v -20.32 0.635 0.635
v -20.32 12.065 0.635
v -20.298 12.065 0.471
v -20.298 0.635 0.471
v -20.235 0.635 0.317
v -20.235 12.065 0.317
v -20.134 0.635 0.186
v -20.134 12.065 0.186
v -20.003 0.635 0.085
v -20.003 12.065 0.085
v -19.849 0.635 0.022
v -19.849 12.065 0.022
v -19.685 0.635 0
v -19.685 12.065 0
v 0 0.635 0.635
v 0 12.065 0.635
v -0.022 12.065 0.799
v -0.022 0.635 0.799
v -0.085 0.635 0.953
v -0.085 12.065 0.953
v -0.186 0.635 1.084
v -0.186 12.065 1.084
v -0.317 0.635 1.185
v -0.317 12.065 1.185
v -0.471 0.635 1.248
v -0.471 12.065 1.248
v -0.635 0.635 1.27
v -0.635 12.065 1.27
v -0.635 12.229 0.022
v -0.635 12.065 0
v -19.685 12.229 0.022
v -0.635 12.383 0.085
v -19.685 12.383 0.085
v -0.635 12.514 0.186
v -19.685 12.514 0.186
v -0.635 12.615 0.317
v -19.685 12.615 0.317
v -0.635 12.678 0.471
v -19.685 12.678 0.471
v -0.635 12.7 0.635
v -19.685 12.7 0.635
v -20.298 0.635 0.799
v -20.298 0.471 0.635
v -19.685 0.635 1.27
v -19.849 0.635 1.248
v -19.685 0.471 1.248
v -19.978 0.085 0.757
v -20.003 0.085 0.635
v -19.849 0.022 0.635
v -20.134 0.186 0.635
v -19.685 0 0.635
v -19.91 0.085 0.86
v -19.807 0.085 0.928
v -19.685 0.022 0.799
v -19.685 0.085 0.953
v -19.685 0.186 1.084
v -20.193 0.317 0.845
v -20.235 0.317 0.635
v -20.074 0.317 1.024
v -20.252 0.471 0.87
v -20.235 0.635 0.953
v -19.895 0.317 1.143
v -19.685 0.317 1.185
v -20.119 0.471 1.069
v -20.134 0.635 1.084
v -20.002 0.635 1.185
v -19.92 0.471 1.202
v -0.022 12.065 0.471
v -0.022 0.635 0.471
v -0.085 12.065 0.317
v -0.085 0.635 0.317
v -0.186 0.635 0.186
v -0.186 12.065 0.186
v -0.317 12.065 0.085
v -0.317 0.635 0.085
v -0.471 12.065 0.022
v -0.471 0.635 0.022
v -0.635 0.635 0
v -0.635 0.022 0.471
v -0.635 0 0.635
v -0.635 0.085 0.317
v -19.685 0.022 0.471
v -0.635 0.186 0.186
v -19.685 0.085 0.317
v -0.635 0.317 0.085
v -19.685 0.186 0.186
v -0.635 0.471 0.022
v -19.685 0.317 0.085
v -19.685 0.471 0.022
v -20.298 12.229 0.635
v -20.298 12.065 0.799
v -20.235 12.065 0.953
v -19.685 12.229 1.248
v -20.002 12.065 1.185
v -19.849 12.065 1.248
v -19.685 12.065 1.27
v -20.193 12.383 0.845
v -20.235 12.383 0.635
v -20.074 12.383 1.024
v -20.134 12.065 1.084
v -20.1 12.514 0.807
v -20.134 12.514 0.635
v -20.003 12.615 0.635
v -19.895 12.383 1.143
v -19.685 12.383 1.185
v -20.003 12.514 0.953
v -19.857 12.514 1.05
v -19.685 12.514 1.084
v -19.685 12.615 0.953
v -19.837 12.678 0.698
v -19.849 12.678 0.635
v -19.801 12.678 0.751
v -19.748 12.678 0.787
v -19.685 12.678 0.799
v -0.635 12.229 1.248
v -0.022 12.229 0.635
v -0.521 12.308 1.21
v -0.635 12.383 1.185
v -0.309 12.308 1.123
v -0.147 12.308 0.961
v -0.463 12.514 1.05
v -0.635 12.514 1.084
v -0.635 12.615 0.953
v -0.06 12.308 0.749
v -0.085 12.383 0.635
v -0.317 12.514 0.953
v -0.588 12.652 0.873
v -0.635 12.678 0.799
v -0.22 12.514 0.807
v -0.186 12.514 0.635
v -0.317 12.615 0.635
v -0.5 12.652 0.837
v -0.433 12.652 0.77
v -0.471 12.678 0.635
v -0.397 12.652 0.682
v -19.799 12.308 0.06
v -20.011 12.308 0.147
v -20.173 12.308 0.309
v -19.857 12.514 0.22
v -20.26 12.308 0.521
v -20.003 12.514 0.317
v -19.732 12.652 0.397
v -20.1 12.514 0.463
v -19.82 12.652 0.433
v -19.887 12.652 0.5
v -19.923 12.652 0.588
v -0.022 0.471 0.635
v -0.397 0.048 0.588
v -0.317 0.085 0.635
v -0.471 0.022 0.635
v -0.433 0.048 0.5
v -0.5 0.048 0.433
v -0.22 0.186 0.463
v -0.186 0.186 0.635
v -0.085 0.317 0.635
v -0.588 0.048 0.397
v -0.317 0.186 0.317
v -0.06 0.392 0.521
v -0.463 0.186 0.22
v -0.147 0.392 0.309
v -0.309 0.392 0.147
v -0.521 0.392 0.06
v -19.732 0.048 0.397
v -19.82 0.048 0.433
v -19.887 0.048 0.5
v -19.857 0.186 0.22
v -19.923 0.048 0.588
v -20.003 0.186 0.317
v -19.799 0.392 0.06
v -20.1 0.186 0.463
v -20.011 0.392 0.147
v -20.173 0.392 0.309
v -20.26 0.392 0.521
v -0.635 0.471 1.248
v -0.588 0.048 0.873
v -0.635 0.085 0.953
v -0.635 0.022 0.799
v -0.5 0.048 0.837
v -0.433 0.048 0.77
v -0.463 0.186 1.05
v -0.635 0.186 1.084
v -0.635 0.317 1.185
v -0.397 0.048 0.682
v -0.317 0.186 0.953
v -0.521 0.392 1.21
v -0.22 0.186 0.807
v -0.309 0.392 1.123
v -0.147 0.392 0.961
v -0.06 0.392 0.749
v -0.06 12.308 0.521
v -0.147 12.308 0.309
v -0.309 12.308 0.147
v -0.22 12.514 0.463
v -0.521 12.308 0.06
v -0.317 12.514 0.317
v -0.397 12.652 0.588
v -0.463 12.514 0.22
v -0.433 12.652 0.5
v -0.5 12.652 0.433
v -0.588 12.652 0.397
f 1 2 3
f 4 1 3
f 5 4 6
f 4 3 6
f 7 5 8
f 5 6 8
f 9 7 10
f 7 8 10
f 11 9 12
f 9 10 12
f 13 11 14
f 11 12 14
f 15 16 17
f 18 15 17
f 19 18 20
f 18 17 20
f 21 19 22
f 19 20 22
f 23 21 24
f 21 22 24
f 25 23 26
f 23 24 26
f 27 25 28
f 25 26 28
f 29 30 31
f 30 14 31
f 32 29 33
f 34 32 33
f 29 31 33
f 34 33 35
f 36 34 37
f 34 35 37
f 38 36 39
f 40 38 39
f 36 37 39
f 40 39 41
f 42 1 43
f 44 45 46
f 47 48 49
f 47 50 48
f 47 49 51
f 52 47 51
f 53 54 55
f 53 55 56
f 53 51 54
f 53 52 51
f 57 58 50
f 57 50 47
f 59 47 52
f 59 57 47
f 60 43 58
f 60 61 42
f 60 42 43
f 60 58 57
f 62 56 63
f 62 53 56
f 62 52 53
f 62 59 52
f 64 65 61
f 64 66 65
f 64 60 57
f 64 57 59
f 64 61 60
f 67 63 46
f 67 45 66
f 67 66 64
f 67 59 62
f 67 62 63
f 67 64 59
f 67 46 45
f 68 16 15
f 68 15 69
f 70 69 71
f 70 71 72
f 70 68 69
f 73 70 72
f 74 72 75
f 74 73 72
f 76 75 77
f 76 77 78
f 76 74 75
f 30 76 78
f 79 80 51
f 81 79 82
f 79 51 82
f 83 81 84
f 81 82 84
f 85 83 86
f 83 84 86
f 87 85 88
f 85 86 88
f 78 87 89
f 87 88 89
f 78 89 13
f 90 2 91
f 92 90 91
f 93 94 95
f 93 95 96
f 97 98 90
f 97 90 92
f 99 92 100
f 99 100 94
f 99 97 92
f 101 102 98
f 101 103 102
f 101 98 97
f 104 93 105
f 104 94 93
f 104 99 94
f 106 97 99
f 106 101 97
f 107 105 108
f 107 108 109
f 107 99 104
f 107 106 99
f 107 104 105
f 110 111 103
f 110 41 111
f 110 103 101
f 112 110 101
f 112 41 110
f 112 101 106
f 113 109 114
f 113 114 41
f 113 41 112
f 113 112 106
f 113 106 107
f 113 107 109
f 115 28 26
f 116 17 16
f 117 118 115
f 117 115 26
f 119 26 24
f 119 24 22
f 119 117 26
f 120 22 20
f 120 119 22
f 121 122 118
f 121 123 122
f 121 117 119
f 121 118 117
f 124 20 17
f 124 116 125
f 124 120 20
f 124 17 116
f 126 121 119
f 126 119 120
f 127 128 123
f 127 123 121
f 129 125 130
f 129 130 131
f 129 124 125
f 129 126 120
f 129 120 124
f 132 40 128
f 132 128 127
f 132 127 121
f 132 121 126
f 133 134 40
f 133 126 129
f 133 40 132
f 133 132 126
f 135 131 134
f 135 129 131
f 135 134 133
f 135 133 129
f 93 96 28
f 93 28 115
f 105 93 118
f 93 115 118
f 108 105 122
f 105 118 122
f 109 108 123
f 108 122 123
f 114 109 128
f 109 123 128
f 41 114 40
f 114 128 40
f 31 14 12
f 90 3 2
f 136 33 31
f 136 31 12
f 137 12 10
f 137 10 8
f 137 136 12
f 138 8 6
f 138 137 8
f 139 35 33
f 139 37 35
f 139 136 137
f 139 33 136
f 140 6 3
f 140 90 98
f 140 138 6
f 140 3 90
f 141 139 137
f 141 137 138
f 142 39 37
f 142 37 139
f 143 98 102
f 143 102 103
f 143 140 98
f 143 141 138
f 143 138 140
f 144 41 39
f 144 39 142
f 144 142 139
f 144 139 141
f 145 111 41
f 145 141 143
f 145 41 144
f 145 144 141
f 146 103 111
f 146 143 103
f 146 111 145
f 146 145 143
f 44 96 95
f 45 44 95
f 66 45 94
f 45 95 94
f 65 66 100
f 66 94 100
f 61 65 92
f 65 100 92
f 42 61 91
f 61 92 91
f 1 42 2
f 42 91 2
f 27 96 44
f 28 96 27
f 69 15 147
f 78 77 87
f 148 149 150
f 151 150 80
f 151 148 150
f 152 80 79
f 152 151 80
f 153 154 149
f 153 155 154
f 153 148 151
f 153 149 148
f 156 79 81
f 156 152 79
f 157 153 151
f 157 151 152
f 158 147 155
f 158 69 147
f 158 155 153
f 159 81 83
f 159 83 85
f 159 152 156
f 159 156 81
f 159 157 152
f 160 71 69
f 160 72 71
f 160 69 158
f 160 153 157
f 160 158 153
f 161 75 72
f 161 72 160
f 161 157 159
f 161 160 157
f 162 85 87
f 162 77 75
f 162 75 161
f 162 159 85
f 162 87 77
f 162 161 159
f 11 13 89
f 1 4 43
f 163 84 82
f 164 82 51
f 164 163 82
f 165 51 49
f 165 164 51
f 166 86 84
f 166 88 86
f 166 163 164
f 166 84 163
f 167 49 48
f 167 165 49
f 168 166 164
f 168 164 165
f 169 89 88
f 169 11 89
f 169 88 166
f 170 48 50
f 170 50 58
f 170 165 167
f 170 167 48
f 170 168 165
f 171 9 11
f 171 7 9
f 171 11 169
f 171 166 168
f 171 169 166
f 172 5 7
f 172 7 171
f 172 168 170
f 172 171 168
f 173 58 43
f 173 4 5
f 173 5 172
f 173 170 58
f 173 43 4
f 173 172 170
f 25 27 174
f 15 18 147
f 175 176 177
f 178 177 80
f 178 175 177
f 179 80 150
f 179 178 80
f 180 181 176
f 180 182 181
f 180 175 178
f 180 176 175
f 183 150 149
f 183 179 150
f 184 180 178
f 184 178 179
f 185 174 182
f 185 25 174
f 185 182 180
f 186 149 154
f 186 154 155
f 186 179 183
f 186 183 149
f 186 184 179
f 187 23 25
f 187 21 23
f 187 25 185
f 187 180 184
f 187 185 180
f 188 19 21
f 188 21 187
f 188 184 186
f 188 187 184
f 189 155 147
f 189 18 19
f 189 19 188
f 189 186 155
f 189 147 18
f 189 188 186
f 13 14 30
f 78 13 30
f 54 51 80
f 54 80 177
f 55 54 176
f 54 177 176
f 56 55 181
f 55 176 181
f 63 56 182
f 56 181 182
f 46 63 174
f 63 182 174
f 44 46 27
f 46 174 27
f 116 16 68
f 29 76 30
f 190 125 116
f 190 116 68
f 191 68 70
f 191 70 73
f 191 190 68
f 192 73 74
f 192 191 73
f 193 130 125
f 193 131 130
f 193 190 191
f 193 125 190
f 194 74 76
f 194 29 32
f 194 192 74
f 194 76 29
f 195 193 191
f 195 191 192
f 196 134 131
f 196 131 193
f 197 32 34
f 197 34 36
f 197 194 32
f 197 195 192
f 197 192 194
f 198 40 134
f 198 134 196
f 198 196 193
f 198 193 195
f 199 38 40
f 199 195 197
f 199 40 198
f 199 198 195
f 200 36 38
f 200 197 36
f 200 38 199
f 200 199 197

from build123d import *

# Parameters (mm, degrees)
F0_W     = 20.32
F0_H     = 12.7
F1_DEPTH = 1.27
F2_R     = 0.63499
F3_R     = 0.635
F4_R     = 0.63499
F5_R     = 0.63499
F6_R     = 0.63499
F7_W     = 17.7417555824
F7_H     = 10.0744650699
F8_DEPTH = 1.27


# Not quite as in the source:
# - a fillet or chamfer is up to 0.001 mm smaller than in the source, because OpenCascade refuses the exact size


with BuildPart() as f1:
    # F0 (on Top) → F1 (new body)
    with BuildSketch(Plane.XY):
        with Locations((-10.16, 6.35)):
            Rectangle(F0_W, F0_H)
    extrude(amount=F1_DEPTH)

    # F2 (radius 0.635 in the source; OpenCascade refuses exactly that, so slightly less here)
    f2_edges = [f1.edges().sort_by_distance(p)[0] for p in [
        (0, 6.35, 1.27),
        (0, 6.35, 0),
    ]]
    fillet(f2_edges, radius=F2_R)

    # F3
    f3_edges = [f1.edges().sort_by_distance(p)[0] for p in [
        (-20.32, 6.35, 1.27),
    ]]
    fillet(f3_edges, radius=F3_R)

    # F4 (radius 0.635 in the source; OpenCascade refuses exactly that, so slightly less here)
    f4_edges = [f1.edges().sort_by_distance(p)[0] for p in [
        (-20.32, 6.35, 0),
    ]]
    fillet(f4_edges, radius=F4_R)

    # F5 (radius 0.635 in the source; OpenCascade refuses exactly that, so slightly less here)
    f5_edges = [f1.edges().sort_by_distance(p)[0] for p in [
        (-10.159995, 12.7, 1.27),
    ]]
    fillet(f5_edges, radius=F5_R)

    # F6 (radius 0.635 in the source; OpenCascade refuses exactly that, so slightly less here)
    f6_edges = [f1.edges().sort_by_distance(p)[0] for p in [
        (-10.159995, 0, 1.27),
    ]]
    fillet(f6_edges, radius=F6_R)

    # F7 (on Top) → F8 (join)
    with BuildSketch(Plane.XY):
        with Locations((-10.1206521504, 6.3767505344)):
            Rectangle(F7_W, F7_H)
    extrude(amount=F8_DEPTH)


solid = f1.part
